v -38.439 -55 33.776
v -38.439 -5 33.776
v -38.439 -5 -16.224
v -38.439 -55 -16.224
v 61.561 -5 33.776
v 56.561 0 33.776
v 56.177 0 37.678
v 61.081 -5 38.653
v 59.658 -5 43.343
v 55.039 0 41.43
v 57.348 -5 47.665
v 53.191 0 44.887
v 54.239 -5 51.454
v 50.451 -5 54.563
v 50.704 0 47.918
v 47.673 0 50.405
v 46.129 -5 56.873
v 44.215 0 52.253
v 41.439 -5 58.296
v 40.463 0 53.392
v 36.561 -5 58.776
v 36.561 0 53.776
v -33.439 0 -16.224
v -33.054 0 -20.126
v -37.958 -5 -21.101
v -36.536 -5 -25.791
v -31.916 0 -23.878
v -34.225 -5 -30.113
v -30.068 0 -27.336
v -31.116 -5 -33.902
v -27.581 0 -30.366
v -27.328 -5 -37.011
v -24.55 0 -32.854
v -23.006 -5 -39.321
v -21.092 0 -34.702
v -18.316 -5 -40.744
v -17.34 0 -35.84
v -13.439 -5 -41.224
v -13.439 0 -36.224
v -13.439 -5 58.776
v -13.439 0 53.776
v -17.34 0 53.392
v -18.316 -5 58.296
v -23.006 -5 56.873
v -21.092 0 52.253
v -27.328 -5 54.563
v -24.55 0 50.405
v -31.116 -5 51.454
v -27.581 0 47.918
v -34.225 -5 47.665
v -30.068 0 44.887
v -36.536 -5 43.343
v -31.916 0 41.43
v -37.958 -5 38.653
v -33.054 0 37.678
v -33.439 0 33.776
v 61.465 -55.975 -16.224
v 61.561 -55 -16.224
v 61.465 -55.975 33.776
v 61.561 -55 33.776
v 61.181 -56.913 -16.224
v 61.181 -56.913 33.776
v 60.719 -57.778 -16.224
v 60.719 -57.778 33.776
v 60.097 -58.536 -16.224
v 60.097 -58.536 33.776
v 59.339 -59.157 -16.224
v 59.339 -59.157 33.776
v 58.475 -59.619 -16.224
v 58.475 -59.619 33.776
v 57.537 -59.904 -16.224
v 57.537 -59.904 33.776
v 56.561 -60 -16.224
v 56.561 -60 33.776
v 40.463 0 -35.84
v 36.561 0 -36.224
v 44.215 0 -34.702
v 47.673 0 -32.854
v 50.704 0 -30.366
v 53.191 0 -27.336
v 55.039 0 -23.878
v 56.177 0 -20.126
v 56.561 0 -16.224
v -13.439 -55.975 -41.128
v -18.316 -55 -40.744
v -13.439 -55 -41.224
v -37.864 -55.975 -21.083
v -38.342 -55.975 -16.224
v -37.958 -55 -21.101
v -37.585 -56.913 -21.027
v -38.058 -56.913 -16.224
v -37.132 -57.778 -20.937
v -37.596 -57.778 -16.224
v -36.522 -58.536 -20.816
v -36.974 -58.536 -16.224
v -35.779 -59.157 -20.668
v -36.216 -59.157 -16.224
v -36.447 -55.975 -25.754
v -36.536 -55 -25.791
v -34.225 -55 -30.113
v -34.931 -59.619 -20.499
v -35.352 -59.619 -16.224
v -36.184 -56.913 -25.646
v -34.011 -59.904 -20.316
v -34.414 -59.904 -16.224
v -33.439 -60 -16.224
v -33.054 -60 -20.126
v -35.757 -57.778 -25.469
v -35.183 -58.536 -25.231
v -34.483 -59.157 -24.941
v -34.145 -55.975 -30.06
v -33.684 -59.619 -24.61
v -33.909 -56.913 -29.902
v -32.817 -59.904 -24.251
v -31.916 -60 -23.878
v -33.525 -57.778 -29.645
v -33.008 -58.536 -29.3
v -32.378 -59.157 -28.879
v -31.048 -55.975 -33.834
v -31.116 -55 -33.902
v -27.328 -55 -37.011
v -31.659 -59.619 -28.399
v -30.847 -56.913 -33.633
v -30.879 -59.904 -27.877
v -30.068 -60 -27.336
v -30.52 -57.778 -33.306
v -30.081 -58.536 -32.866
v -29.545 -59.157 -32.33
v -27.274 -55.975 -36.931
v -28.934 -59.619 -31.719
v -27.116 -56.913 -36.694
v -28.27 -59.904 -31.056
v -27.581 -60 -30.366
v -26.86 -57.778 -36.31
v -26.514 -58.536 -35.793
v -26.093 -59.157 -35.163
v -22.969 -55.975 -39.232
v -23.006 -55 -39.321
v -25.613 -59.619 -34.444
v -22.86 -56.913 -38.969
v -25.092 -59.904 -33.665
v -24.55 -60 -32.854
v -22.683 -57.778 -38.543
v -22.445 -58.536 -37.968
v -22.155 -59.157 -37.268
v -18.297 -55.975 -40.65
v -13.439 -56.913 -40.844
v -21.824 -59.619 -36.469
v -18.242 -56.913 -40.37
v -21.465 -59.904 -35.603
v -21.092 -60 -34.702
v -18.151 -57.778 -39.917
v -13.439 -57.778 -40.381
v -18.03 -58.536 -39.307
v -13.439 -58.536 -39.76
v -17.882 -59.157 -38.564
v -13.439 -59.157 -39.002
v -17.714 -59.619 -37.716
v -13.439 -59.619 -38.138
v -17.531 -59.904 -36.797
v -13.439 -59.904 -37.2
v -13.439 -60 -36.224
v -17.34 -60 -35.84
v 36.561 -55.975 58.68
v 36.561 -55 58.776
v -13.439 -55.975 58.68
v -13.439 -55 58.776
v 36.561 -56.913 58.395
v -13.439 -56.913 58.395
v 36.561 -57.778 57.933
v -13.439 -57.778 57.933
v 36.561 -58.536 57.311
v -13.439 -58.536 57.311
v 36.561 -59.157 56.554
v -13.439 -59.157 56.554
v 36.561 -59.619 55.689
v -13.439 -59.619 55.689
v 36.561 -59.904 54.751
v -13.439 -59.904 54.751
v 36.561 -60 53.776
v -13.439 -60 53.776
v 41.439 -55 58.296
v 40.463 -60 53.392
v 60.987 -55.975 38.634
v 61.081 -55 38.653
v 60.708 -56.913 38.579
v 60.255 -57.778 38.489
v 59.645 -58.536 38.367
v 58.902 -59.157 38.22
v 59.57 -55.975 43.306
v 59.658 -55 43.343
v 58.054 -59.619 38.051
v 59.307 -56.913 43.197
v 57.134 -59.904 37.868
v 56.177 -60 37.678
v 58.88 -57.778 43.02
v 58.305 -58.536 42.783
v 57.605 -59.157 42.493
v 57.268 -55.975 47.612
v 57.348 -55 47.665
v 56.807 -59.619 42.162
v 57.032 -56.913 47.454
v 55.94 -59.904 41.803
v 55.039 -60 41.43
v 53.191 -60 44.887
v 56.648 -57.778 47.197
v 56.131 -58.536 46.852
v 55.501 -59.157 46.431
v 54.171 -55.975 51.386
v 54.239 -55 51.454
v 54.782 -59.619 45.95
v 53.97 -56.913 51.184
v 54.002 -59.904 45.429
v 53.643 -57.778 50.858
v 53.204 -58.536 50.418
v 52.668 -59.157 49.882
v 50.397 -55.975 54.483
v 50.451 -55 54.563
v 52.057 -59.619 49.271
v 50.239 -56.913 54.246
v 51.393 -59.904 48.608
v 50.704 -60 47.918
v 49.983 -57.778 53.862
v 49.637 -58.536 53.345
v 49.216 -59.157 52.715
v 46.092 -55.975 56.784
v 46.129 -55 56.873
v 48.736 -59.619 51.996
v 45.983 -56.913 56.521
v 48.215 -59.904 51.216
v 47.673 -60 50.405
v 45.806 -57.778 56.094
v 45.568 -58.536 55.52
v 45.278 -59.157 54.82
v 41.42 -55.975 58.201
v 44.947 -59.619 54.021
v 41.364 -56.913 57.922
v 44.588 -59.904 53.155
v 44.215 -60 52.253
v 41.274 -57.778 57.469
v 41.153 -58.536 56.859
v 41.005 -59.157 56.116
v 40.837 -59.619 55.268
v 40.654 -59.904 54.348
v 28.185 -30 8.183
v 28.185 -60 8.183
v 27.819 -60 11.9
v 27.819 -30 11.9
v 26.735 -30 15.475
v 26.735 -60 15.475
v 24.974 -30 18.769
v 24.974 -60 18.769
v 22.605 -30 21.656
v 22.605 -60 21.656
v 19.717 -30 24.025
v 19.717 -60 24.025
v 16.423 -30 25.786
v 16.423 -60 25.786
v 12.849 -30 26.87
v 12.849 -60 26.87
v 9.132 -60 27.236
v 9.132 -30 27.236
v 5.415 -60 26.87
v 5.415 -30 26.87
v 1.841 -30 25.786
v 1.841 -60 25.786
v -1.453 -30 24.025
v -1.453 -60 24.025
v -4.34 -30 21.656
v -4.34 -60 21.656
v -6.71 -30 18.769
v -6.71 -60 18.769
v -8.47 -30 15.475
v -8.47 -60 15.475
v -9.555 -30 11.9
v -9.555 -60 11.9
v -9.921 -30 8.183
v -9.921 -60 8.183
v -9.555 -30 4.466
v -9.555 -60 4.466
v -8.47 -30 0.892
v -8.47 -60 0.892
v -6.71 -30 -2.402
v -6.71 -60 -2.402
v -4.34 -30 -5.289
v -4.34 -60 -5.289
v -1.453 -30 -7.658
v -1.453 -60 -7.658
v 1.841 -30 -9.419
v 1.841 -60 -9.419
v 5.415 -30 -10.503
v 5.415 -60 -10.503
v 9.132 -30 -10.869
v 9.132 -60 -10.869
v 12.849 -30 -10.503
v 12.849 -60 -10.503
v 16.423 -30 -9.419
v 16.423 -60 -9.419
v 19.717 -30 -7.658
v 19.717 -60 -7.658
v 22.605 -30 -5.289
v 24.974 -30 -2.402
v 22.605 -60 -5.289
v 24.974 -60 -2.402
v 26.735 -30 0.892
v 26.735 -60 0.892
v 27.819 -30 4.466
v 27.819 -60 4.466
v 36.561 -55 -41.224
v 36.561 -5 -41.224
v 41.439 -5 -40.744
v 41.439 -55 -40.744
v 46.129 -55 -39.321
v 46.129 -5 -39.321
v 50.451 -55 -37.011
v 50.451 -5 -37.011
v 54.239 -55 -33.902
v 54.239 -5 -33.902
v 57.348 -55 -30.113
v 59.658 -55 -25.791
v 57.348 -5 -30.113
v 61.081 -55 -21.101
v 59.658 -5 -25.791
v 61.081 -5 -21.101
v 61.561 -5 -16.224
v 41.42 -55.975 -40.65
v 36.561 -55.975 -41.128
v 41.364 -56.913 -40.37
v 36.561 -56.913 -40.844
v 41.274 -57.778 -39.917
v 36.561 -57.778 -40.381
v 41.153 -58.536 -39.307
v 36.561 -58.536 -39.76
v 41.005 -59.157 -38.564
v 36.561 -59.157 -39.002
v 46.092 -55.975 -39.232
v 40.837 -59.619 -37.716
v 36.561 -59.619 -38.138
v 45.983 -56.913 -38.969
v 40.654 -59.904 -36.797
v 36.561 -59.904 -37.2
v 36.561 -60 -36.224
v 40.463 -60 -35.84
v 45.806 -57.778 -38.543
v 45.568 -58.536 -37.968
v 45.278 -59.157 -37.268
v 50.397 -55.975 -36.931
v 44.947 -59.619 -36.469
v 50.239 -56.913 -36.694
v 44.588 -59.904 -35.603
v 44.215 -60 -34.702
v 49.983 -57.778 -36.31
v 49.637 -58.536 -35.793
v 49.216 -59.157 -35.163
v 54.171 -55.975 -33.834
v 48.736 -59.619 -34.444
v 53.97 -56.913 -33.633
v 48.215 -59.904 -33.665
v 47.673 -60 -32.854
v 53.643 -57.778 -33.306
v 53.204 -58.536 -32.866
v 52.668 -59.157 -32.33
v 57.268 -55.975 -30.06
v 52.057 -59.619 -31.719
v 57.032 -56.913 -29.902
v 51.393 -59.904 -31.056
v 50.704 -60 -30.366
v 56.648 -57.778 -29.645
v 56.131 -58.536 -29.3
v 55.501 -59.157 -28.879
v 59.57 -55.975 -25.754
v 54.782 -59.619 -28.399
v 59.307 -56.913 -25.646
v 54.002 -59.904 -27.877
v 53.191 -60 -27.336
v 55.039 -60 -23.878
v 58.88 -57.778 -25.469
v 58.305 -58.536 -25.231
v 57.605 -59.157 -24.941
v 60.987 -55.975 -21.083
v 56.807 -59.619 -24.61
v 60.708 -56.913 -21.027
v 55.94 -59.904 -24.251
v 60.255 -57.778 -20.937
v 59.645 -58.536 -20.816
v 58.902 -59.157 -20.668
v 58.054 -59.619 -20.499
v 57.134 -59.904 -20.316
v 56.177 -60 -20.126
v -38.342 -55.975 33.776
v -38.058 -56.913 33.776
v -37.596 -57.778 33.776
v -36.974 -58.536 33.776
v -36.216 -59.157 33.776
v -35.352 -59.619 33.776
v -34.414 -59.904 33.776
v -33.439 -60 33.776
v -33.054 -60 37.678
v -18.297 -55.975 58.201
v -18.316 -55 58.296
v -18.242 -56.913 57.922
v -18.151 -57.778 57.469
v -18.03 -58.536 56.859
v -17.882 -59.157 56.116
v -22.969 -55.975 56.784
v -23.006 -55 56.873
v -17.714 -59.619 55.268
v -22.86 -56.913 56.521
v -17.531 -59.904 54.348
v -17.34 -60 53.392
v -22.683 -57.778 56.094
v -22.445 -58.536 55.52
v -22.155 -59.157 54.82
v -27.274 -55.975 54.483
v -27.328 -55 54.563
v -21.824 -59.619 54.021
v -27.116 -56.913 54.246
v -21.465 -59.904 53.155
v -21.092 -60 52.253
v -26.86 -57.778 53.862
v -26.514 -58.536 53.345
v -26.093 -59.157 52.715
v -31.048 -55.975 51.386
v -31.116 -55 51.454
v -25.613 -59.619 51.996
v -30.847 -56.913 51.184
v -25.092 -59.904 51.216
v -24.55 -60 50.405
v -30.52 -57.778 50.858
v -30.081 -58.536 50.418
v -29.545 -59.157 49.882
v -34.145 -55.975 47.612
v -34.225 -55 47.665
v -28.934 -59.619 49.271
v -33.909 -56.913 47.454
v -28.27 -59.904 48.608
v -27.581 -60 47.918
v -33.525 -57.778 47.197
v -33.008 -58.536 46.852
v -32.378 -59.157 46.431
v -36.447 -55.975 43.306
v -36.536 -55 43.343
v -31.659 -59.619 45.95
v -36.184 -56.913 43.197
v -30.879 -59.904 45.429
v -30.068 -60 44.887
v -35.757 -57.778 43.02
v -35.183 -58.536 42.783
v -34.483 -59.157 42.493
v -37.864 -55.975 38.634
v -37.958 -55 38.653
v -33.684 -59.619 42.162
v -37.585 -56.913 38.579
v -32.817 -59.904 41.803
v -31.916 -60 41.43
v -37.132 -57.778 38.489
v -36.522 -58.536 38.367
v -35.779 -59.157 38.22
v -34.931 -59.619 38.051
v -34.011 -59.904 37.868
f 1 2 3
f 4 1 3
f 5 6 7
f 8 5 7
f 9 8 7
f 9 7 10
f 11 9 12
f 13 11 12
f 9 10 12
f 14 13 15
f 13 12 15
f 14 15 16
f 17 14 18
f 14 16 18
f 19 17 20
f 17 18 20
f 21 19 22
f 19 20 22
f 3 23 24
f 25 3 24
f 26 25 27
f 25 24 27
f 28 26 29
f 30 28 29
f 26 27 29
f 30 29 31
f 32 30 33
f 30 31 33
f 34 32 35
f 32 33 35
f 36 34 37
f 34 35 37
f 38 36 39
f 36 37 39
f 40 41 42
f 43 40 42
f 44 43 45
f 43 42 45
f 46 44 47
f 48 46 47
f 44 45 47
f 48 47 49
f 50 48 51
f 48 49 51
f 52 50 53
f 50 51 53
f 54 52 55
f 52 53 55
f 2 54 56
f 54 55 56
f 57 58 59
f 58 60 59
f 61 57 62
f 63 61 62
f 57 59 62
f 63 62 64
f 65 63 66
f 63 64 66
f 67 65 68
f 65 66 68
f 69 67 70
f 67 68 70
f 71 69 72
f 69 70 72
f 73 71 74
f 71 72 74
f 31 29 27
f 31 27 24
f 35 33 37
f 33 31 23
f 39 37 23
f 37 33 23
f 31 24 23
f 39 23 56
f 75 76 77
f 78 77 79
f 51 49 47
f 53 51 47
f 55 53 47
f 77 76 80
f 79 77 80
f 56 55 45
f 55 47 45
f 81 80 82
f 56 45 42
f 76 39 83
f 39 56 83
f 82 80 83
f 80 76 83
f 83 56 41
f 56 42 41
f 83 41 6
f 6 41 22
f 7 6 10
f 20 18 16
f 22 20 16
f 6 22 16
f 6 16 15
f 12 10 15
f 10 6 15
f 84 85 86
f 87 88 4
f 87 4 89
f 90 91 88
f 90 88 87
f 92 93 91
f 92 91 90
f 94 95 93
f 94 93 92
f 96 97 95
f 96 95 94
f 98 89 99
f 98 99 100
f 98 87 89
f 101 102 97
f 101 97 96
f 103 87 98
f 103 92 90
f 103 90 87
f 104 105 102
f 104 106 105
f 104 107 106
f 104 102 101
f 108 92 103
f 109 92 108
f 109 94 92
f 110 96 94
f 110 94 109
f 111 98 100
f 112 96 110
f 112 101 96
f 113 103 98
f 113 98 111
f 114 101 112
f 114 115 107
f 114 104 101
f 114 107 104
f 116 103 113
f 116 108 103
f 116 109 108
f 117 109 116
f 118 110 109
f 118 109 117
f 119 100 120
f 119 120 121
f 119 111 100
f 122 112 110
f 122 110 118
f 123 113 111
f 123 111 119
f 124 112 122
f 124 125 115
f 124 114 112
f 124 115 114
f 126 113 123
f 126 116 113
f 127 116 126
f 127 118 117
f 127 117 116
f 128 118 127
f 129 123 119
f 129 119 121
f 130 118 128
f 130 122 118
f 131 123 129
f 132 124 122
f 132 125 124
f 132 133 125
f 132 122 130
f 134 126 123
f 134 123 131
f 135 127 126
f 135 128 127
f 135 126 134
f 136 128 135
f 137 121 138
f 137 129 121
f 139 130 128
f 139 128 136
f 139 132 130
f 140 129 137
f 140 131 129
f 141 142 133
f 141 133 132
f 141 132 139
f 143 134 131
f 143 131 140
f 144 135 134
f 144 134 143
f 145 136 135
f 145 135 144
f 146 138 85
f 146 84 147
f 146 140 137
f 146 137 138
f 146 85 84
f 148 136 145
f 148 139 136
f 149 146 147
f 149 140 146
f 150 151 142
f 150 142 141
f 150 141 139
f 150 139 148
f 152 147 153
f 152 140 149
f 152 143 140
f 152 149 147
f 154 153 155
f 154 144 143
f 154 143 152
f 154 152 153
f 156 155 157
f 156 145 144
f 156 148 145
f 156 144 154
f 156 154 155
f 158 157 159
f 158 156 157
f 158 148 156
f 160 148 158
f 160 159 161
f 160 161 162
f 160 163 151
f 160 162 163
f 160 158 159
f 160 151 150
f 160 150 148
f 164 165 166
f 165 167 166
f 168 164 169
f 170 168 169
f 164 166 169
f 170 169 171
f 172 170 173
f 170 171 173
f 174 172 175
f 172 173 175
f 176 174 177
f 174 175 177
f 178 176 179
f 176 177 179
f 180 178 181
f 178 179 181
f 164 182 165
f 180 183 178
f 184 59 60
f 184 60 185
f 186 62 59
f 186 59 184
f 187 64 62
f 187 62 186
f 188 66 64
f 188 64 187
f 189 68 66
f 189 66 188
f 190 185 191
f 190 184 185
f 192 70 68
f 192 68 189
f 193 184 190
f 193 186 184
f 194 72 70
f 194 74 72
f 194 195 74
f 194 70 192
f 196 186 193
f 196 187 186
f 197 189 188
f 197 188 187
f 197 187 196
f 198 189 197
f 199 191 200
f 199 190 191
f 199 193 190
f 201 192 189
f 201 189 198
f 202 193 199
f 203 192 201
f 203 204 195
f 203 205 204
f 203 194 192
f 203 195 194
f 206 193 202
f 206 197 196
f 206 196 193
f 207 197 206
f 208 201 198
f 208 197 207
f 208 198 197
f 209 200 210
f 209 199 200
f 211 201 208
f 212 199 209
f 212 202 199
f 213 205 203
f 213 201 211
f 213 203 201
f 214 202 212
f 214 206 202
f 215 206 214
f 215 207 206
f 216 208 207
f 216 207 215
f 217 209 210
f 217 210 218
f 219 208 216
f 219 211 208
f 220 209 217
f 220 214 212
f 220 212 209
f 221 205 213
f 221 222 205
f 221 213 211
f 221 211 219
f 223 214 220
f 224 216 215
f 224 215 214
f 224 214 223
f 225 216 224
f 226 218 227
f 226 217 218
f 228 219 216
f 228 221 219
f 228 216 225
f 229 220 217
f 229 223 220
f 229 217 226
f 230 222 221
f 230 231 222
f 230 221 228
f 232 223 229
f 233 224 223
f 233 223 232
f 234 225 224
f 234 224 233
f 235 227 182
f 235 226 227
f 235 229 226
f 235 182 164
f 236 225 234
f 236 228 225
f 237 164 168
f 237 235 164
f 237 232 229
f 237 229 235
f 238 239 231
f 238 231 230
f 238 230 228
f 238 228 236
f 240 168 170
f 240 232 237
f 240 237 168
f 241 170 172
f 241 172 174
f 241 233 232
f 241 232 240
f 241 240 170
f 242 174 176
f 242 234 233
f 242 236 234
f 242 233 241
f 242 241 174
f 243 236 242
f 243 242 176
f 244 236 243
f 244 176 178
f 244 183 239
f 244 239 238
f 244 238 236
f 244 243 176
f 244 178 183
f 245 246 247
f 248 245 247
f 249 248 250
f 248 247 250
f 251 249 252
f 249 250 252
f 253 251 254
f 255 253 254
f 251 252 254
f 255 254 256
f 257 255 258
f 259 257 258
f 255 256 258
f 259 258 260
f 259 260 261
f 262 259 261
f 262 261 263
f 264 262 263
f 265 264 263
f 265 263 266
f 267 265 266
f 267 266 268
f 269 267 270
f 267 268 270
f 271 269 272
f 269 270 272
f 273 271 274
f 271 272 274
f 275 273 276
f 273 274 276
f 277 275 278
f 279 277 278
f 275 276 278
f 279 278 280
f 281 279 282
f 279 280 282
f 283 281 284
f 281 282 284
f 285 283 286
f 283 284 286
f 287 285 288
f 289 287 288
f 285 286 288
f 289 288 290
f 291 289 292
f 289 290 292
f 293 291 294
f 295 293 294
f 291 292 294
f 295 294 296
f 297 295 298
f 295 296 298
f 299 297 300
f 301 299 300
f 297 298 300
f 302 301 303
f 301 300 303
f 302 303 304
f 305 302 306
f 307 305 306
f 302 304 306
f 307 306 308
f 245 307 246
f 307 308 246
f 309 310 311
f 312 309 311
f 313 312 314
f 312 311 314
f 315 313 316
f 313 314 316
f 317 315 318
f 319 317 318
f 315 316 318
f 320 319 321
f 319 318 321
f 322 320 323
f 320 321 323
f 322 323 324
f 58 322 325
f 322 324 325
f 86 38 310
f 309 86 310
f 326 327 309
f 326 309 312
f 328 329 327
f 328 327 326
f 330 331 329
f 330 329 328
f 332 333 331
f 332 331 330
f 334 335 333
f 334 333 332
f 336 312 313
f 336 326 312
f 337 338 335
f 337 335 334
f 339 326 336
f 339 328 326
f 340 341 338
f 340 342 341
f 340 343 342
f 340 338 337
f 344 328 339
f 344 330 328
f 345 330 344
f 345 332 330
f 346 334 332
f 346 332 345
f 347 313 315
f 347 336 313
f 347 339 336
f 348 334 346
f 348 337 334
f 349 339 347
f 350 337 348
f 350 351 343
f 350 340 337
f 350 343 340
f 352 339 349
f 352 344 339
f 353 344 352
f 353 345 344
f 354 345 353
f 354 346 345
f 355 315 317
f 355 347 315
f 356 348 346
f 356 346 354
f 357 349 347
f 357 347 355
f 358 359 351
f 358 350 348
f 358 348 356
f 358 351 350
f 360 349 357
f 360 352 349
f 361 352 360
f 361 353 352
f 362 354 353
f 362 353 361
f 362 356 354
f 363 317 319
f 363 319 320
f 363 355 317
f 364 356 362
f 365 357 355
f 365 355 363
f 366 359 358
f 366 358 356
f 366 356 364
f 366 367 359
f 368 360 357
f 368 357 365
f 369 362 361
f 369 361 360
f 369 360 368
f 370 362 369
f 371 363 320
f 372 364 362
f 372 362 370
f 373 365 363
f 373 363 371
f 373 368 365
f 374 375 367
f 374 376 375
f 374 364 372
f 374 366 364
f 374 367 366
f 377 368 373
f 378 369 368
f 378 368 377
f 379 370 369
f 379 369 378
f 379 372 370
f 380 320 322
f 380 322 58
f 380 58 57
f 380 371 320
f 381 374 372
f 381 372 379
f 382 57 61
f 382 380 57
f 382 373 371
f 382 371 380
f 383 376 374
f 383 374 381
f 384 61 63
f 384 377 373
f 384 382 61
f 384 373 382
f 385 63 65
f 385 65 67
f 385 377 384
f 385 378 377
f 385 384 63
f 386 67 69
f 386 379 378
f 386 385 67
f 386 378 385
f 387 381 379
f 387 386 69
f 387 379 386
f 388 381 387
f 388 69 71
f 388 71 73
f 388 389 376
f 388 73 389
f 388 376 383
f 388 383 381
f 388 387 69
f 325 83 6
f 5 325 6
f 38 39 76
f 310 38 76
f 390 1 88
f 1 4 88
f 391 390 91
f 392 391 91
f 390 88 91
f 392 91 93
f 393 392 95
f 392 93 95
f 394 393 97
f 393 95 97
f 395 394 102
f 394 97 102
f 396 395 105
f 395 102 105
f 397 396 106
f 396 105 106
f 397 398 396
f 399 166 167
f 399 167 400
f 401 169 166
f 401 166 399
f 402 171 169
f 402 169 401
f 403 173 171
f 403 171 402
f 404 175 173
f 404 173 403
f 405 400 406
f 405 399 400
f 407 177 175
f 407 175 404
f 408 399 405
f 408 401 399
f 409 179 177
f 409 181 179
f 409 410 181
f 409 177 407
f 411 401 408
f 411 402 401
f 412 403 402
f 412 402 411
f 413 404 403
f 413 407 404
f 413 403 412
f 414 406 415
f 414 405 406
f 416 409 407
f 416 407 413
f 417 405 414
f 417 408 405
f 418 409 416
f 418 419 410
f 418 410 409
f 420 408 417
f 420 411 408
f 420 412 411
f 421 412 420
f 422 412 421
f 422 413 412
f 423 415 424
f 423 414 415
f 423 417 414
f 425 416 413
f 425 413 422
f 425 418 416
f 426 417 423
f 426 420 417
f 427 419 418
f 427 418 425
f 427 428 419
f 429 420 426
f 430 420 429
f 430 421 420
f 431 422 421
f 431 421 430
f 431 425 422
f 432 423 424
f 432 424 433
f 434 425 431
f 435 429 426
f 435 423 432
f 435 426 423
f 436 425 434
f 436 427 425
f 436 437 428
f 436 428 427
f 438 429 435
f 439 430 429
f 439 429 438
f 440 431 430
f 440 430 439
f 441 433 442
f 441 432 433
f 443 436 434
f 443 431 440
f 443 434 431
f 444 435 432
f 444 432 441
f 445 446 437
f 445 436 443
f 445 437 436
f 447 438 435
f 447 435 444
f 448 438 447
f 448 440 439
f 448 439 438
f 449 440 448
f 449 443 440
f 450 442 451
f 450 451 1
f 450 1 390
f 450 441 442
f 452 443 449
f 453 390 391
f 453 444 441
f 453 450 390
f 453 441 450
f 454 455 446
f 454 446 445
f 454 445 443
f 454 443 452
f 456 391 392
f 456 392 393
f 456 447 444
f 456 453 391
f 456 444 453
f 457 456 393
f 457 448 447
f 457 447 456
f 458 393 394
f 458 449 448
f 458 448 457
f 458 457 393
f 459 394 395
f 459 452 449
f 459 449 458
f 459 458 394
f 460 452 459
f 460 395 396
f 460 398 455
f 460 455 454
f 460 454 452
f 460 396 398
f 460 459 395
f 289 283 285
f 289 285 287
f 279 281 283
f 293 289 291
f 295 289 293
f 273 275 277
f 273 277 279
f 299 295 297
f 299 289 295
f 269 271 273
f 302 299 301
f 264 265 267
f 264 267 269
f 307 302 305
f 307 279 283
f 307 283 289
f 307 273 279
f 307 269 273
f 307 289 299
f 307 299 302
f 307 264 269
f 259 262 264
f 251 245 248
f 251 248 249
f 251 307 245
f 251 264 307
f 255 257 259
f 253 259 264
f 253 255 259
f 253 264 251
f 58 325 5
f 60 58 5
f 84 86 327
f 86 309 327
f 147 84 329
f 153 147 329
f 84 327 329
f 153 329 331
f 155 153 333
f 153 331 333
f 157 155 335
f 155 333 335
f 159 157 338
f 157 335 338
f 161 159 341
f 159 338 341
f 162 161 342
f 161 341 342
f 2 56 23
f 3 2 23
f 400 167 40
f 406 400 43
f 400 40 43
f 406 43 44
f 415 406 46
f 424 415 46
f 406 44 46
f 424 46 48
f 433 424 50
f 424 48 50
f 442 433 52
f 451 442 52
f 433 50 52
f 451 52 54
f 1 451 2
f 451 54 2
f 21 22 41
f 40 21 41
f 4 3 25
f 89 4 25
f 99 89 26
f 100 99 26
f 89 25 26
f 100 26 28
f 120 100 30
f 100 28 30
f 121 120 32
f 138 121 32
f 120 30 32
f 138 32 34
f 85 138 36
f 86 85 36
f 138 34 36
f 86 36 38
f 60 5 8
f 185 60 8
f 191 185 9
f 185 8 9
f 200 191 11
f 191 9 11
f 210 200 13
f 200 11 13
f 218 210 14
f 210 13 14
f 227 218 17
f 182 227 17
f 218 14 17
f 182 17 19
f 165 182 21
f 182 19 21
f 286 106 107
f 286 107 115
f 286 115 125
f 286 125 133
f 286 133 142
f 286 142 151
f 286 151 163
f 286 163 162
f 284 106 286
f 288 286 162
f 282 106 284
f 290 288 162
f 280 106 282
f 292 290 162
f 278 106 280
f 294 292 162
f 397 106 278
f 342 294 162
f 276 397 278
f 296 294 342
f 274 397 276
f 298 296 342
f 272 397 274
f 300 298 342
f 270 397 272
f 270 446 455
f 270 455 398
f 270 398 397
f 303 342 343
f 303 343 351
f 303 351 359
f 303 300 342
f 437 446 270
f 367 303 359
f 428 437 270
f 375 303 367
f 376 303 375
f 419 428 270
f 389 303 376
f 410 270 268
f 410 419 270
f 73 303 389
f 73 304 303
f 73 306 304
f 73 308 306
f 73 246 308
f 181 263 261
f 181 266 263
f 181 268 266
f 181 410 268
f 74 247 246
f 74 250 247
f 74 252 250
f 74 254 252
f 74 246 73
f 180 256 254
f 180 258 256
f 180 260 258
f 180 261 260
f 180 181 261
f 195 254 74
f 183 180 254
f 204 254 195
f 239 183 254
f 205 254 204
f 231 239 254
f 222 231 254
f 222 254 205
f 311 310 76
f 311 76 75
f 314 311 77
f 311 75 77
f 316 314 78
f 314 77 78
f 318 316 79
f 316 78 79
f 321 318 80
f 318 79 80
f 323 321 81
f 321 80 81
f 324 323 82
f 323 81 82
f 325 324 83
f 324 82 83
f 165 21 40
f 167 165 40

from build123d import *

# Parameters (mm, degrees)
F1_DEPTH = 60
F2_R     = 5
F3_SIZE  = 5
F4_R     = 19.052839
F5_DEPTH = 30


with BuildPart() as f1:
    # F0 (on Front) → F1 (new body)
    with BuildSketch(Plane.XZ):
        with BuildLine():
            Line((36.56146, 58.775878), (-13.43854, 58.775878))
            ThreePointArc((-13.43854, 58.775878), (-31.116209, 51.453547), (-38.43854, 33.775878))
            Line((-38.43854, 33.775878), (-38.43854, -16.224122))
            ThreePointArc((-38.43854, -16.224122), (-31.116209, -33.901792), (-13.43854, -41.224122))
            Line((-13.43854, -41.224122), (36.56146, -41.224122))
            ThreePointArc((36.56146, -41.224122), (54.23913, -33.901792), (61.56146, -16.224122))
            Line((61.56146, -16.224122), (61.56146, 33.775878))
            ThreePointArc((61.56146, 33.775878), (54.23913, 51.453547), (36.56146, 58.775878))
        make_face()
    extrude(amount=F1_DEPTH)

    # F2
    f2_edges = [f1.edges().sort_by_distance(p)[0] for p in [
        (11.56146, -60, 58.775878),
        (-31.116209, -60, 51.453547),
        (-38.43854, -60, 8.775878),
        (-31.116209, -60, -33.901792),
        (11.56146, -60, -41.224122),
        (54.23913, -60, -33.901792),
        (61.56146, -60, 8.775878),
        (54.23913, -60, 51.453547),
    ]]
    fillet(f2_edges, radius=F2_R)

    # F3
    f3_edges = [f1.edges().sort_by_distance(p)[0] for p in [
        (11.56146, 0, 58.775878),
        (-31.116209, 0, 51.453547),
        (-38.43854, 0, 8.775878),
        (-31.116209, 0, -33.901792),
        (11.56146, 0, -41.224122),
        (54.23913, 0, -33.901792),
        (61.56146, 0, 8.775878),
        (54.23913, 0, 51.453547),
    ]]
    chamfer(f3_edges, length=F3_SIZE)

    # F4 (on face) → F5 (cut)
    with BuildSketch(Plane.XZ.offset(60)):
        with Locations((9.132151, 8.183358)):
            Circle(F4_R)
    extrude(amount=-F5_DEPTH, mode=Mode.SUBTRACT)


solid = f1.part
